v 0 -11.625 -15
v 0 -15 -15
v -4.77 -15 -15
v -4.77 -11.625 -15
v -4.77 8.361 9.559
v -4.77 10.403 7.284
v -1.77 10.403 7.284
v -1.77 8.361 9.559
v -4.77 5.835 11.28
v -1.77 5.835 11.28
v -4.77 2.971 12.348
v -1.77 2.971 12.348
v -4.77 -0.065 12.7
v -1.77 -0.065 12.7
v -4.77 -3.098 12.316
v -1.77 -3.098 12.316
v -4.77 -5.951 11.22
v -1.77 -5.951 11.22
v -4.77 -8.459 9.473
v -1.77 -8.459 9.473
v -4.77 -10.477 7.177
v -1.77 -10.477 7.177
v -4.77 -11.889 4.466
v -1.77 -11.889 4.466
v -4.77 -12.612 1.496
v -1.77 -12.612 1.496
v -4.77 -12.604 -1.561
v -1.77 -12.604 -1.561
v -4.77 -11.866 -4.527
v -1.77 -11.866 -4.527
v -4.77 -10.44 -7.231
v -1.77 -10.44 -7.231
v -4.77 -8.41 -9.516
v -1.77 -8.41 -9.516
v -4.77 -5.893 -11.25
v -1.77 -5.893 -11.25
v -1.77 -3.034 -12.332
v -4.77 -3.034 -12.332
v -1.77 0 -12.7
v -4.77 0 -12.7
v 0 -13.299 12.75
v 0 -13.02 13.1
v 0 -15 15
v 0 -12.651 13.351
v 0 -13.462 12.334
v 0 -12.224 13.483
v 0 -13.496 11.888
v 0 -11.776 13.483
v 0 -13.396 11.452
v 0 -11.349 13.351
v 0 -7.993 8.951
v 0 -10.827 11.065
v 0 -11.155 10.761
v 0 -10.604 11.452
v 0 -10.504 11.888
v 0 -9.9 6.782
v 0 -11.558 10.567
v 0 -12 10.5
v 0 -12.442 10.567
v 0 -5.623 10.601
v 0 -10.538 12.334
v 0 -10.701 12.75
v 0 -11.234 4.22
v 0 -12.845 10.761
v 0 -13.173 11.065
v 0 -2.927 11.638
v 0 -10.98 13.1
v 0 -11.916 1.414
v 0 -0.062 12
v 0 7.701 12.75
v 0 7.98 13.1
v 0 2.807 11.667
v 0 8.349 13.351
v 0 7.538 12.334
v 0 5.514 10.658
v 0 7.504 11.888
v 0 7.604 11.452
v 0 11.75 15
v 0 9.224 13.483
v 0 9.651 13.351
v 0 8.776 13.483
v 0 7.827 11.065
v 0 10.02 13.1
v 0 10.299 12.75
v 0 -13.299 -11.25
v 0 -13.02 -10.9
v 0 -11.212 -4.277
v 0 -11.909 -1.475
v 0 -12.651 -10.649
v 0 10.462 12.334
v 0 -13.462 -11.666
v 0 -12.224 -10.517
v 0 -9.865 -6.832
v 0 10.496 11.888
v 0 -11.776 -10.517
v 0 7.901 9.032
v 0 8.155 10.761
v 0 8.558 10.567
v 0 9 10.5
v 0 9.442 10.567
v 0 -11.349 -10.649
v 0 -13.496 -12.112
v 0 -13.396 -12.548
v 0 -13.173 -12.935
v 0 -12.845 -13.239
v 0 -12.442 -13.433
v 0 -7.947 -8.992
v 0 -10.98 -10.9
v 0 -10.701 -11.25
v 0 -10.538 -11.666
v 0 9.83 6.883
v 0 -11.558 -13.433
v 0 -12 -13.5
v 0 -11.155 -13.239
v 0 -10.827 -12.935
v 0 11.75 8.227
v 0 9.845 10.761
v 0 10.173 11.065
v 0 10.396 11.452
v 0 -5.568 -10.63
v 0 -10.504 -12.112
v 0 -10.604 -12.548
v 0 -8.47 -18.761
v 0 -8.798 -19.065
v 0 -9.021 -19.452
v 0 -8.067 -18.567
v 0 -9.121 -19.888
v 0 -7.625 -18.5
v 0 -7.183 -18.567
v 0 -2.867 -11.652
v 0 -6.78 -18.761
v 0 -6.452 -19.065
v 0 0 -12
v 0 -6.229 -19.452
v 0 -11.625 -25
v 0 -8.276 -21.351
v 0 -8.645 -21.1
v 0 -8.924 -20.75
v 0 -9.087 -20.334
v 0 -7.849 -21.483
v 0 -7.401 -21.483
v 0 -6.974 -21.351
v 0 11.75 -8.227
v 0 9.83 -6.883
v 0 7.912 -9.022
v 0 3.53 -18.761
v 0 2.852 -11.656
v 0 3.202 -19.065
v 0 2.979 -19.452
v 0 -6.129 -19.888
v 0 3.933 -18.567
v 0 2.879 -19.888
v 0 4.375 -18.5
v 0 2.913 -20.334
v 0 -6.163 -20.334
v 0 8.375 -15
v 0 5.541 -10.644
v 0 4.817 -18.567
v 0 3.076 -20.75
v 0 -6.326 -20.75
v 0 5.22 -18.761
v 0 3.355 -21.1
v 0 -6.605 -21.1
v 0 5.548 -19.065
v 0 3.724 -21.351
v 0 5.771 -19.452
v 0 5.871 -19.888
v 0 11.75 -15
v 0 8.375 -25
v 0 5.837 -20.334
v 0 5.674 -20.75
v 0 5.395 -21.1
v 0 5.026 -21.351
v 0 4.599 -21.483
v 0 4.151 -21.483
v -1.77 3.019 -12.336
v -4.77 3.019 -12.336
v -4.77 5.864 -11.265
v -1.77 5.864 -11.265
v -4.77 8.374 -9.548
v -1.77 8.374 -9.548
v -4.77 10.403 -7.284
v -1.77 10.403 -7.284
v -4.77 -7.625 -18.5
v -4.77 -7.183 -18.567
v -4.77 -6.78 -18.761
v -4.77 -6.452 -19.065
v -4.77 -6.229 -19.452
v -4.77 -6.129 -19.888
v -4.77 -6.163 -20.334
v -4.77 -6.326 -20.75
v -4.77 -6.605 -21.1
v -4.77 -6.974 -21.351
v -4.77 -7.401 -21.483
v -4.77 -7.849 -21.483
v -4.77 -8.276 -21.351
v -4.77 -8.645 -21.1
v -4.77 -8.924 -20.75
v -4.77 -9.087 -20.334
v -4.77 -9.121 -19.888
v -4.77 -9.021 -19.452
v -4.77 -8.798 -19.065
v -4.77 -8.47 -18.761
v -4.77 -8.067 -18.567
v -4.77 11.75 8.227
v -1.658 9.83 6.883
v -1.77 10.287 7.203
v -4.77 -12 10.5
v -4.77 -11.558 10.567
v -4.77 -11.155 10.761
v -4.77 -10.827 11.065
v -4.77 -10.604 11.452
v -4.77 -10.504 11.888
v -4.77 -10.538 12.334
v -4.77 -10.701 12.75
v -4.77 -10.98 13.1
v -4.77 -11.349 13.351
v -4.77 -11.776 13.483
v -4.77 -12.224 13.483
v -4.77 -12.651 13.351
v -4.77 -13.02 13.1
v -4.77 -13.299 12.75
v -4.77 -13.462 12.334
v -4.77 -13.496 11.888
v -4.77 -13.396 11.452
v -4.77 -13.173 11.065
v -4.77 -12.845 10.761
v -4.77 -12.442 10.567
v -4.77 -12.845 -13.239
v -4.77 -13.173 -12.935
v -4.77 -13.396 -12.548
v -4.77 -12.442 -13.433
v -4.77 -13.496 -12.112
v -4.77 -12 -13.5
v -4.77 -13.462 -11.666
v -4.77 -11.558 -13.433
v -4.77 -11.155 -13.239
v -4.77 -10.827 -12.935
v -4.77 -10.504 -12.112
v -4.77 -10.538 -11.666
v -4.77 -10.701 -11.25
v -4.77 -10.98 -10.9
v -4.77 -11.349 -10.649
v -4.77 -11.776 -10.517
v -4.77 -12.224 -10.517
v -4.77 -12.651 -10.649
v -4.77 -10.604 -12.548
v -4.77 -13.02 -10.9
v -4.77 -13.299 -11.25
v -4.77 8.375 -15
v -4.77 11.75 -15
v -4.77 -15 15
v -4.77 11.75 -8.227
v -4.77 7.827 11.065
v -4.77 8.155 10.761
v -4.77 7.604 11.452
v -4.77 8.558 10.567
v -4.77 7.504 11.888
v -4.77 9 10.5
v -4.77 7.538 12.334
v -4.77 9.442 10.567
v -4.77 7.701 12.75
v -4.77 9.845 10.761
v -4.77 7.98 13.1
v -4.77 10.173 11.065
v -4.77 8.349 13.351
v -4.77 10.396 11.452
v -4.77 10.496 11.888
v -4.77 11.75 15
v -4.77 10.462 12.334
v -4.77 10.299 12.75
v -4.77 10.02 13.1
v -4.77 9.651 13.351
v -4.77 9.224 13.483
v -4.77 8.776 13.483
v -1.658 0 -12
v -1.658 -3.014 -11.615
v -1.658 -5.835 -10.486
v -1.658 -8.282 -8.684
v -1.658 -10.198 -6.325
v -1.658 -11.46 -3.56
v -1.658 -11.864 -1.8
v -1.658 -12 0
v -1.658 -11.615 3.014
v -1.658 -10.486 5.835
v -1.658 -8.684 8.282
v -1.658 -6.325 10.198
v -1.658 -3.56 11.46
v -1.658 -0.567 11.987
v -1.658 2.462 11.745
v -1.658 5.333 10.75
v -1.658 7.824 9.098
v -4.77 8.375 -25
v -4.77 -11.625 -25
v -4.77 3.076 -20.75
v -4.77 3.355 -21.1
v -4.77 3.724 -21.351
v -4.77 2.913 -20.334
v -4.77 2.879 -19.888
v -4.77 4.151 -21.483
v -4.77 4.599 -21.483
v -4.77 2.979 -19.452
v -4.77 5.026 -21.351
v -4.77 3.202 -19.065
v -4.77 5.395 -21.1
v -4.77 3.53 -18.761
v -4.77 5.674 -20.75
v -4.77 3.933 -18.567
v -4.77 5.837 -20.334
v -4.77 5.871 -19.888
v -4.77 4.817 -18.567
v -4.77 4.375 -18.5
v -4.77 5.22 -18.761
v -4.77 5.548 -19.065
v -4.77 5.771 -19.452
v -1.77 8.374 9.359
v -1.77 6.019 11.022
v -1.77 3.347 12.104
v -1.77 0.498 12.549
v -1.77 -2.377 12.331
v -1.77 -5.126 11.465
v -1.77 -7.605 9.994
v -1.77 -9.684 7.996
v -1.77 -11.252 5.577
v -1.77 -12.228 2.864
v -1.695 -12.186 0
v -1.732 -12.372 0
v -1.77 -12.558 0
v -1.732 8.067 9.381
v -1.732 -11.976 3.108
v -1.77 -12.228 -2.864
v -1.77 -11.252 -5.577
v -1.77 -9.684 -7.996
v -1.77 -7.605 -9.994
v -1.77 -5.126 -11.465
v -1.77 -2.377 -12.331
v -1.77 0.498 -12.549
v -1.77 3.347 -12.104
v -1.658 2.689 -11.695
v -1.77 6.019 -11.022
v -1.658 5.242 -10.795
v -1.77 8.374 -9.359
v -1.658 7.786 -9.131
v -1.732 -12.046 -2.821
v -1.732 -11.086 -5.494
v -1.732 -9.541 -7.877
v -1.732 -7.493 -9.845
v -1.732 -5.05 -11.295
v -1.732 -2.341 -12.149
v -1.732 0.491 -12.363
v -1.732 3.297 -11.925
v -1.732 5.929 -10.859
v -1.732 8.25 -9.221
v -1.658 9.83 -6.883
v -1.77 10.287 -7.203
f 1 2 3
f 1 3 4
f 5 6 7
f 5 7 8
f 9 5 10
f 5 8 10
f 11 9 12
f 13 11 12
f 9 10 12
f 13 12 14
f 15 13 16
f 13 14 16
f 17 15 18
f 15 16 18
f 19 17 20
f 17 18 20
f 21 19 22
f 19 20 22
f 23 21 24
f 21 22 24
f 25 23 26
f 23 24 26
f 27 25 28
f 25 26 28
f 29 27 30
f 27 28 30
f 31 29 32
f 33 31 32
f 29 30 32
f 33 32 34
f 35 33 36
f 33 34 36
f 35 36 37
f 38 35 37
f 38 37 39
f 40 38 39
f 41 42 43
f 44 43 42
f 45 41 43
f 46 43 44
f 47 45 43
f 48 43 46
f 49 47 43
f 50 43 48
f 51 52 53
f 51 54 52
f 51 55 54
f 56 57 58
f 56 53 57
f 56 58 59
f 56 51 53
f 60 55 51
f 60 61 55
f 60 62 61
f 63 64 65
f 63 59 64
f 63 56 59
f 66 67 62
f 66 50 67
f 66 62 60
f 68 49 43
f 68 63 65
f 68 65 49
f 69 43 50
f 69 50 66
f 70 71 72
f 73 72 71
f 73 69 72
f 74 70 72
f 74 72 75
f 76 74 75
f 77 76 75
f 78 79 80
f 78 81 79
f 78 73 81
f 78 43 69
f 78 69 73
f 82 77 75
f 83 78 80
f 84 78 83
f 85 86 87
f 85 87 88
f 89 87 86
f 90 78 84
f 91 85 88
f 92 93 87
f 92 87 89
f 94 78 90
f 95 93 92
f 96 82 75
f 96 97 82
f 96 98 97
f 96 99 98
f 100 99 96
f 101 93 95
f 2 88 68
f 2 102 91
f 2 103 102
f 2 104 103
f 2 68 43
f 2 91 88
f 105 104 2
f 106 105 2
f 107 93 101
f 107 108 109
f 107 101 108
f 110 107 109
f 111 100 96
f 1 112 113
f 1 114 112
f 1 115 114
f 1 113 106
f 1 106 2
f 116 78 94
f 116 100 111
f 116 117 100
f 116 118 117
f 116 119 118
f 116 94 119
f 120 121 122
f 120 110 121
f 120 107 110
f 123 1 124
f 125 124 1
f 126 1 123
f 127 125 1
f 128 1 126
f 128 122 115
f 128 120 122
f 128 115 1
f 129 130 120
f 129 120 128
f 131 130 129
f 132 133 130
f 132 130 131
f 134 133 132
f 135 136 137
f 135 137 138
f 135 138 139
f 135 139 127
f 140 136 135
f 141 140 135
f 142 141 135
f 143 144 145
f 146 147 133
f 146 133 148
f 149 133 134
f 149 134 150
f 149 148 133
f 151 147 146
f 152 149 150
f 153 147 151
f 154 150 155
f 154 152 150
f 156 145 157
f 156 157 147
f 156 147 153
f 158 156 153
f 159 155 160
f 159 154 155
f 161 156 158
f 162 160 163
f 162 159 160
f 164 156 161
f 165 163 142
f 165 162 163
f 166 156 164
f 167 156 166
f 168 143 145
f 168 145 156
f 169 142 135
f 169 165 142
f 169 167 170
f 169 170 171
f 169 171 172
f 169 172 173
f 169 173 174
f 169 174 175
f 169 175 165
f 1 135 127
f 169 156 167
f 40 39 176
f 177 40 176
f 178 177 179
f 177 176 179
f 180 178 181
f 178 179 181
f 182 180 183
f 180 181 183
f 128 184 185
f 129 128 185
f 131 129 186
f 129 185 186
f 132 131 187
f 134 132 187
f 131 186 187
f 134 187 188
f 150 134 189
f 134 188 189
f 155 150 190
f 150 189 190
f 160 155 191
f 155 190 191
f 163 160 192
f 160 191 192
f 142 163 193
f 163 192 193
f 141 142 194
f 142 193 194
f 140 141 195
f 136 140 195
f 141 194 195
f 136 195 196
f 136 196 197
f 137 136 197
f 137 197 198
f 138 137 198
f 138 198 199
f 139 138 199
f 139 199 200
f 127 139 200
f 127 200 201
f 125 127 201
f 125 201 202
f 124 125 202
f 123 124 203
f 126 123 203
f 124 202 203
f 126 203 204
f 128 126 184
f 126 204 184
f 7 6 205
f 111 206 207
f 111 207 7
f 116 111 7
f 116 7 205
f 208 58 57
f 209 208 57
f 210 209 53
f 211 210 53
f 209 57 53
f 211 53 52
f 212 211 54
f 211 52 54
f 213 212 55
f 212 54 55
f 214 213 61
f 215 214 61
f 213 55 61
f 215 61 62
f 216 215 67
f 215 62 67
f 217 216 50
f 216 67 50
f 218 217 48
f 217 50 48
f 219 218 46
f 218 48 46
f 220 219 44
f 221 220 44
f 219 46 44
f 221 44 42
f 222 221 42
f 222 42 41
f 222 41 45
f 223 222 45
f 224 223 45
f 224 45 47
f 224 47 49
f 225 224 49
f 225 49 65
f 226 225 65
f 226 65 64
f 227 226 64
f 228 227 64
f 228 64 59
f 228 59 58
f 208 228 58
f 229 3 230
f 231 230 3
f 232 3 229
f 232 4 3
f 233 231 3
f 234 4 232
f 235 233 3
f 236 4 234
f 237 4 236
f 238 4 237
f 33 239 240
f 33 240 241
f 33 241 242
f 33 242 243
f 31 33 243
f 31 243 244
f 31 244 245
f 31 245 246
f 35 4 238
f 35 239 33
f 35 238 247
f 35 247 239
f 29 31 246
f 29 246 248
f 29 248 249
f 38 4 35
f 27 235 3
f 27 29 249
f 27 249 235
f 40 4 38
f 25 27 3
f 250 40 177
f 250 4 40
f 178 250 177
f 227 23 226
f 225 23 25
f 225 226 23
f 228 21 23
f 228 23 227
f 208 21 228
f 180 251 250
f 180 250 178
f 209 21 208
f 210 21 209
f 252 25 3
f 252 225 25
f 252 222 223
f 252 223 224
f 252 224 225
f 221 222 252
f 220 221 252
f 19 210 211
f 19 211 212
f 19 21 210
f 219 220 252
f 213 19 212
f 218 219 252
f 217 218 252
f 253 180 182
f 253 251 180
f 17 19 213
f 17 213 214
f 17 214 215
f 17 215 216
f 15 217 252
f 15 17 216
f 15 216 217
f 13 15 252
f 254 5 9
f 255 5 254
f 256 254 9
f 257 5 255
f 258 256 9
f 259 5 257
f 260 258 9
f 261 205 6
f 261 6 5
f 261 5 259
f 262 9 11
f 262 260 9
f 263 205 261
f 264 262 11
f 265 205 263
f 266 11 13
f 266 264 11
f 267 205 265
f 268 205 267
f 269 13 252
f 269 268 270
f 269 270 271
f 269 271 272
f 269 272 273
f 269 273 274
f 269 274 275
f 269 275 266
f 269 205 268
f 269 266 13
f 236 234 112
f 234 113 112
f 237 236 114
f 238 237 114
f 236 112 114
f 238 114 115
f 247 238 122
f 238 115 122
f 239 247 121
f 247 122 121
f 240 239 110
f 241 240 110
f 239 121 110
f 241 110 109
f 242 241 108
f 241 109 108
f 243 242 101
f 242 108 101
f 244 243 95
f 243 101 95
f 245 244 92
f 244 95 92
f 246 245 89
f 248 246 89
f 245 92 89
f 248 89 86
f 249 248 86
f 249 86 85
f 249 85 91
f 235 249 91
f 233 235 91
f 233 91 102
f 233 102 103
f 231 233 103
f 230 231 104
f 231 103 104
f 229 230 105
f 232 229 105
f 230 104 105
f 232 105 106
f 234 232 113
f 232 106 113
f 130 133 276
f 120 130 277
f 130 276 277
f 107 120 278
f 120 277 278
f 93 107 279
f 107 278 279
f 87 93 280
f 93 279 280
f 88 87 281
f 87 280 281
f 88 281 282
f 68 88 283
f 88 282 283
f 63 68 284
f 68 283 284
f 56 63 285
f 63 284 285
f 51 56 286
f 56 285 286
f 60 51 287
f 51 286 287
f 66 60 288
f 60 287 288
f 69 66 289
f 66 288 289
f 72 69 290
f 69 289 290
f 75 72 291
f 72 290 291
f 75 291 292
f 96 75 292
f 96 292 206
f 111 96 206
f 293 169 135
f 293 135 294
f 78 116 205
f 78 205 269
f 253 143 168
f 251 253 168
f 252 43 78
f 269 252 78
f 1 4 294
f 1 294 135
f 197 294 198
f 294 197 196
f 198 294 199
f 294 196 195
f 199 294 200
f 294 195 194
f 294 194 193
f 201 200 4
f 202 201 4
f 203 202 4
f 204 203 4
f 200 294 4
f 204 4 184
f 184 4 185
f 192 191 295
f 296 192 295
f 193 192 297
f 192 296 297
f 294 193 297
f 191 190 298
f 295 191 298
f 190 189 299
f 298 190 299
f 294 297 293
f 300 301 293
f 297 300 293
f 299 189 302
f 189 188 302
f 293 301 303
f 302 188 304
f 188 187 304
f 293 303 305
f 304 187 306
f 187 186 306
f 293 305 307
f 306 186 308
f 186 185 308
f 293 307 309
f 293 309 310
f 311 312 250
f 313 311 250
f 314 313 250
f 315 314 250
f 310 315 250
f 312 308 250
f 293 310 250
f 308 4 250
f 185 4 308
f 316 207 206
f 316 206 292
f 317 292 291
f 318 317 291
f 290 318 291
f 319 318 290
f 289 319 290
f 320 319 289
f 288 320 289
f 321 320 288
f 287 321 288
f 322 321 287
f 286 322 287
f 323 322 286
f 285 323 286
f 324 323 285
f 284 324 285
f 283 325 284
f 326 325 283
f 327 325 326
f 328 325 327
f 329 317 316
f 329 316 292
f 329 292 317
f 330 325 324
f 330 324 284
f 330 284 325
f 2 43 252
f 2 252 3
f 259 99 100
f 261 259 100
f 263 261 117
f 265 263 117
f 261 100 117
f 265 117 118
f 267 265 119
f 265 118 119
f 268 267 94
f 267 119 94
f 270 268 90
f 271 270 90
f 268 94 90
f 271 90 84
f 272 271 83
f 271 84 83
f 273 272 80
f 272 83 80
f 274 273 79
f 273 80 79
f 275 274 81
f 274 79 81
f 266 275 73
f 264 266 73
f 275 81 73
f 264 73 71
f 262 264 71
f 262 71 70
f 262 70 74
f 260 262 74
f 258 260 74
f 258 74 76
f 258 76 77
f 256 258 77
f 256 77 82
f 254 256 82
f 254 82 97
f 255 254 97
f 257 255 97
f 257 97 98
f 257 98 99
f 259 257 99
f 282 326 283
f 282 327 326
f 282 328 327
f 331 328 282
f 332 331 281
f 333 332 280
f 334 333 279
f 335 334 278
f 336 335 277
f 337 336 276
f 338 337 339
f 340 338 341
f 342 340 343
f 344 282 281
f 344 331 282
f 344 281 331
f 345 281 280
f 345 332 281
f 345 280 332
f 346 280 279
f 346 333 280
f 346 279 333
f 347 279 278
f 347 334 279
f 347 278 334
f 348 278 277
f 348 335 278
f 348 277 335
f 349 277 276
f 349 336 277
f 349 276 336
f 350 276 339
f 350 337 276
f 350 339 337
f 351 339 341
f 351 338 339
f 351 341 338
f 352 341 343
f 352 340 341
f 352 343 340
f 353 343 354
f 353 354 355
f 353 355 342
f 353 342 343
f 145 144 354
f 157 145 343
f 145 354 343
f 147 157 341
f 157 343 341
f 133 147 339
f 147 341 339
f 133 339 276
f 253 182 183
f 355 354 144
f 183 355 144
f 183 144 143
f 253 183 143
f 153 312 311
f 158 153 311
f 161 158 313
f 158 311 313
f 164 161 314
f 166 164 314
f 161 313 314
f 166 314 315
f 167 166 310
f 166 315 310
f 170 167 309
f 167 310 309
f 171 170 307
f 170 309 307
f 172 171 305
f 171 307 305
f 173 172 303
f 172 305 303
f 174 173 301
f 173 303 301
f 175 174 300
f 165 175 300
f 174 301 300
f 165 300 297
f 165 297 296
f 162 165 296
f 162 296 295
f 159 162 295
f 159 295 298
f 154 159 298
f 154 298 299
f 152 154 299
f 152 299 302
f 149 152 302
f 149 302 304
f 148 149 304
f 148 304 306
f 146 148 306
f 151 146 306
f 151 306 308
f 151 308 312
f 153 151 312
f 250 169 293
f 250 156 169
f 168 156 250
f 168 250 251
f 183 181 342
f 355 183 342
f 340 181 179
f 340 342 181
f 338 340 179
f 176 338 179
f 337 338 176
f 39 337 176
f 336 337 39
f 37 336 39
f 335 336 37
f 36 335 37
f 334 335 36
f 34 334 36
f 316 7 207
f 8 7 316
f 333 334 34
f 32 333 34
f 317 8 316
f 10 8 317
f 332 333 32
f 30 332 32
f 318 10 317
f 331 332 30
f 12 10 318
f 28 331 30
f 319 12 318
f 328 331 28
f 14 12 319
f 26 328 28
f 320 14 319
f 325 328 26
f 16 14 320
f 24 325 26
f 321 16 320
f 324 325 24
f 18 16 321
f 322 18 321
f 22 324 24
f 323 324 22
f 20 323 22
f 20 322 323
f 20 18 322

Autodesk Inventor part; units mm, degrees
ref_plane "YZ Plane" through (0, 0, 0) normal (1, 0, 0) x (0, 1, 0)
ref_plane "XZ Plane" through (0, 0, 0) normal (0, 1, 0) x (-1, 0, 0)
sketch "Sketch1" plane through (0, 0, 0) normal (1, 0, 0) x (0, 1, 0)
  line L0 (-15, 15) -> (15, 15)
  line L1 (15, 15) -> (15, -15)
  line L2 (15, -15) -> (-15, -15)
  line L3 (-15, -15) -> (-15, 15)
  line L4 (-15, 15) -> (15, -15) construction
  line L5 (15, 15) -> (-15, -15) construction
  point P0 (0, 0)
  dimension "d0" = 30
  dimension "d1" = 30
extrude "Extrusion1" add sketch "Sketch1" along normal blind 1.7695
sketch "Sketch2" plane through (1.7695, 0, 0) normal (1, 0, 0) x (0, 0, -1)
  circle A0 centre (0, 0) radius 12
  dimension "d4" = 24
extrude "Extrusion2" cut sketch "Sketch2" against normal up to next
sketch "Sketch3" plane through (0, 0, 0) normal (0, 0, 1) x (1, 0, 0)
  line L0 (1.7695, 15) -> (1.7695, -15) projected
  line L1 (1.7695, 0) -> (1.7695, -12.5584)
  line L2 (0.5, 0) -> (1.7695, 0)
  arc A0 (0.5, 0) -> (1.7695, -12.5584) centre (63.25, 0) ccw
  point P0 (0, 0)
  dimension "d7" = 12.5584
  dimension "d8" = 125.5
revolve "Revolution1" cut sketch "Sketch3" angle 360 about axis through (0.5, 0, 0) along (1, 0, 0)
sketch "Sketch4" plane through (1.7695, 0, 0) normal (1, 0, 0) x (0, 0, -1)
  circle A0 centre (0, 0) radius 12.7
  line L0 (-15, 15) -> (-15, -15) projected
  line L1 (-15, 15) -> (15, 15)
  line L2 (15, 15) -> (15, -15)
  line L3 (15, -15) -> (-15, -15)
  line L4 (-15, -15) -> (-15, 15)
  dimension "d10" = 25.4
extrude "Extrusion3" add sketch "Sketch4" along normal blind 3
ref_plane "Work Plane1" through (0, 0, 0) normal (-1, 0, 0) x (0, 0, 1)
mirror "Mirror1" about plane through (0, 0, 0) normal (-1, 0, 0) of "Extrusion1", "Extrusion2", "Revolution1", "Extrusion3"
sketch "Sketch8" plane through (4.7695, 0, 0) normal (1, 0, 0) x (0, 0, -1)
  circle A0 centre (12, -12) radius 1.5
  line L0 (-15, -15) -> (15, -15) projected
  line L1 (15, -15) -> (15, 15) projected
  circle A1 centre (-12, -12) radius 1.5
  circle A2 centre (-12, 9) radius 1.5
  line L2 (-15, 15) -> (-15, -15) projected
  line L3 (15, 15) -> (-15, 15) projected
  point P0 (0, 0)
  dimension "d30" = 3
  dimension "d31" = 3
  dimension "d32" = 3
  dimension "d33" = 3
  dimension "d34" = 3
  dimension "d35" = 3
  dimension "d36" = 6
extrude "Extrusion7" cut sketch "Sketch8" against normal up to surface (9.5391 mm away) contours A0 | A1 | A2
sketch "Sketch9" plane through (4.7695, 0, 0) normal (1, 0, 0) x (0, 0, -1)
  line L0 (0, 0) -> (-8.2274, 11.75)
  line L1 (-8.2274, 11.75) -> (-15, 11.75)
  line L2 (-15, 15) -> (-15, -15) projected
  line L3 (0, 0) -> (0, 15) construction
  line L4 (-15, 11.75) -> (-15, 15)
  line L5 (15, 15) -> (-15, 15) projected
  line L6 (0, 15) -> (-15, 15)
  line L7 (0, 0) -> (8.2274, 11.75)
  line L8 (8.2274, 11.75) -> (15, 11.75)
  line L9 (15, 15) -> (15, -15)
  line L10 (-15, 15) -> (15, 15)
  dimension "d39" = 35
  dimension "d42" = 3.25
extrude "Extrusion8" cut sketch "Sketch9" against normal up to surface (9.5391 mm away)
sketch "Sketch11" plane through (4.7695, -15, -15) normal (0, 0, -1) x (-1, 0, 0)
  line L0 (9.5391, 0) -> (9.5391, 26.75) projected
  line L1 (0, 0) -> (9.5391, 26.75) construction
  line L2 (0, 26.75) -> (9.5391, 26.75) projected
  line L3 (0, 26.75) -> (9.5391, 0) construction
  line L4 (0, 0) -> (0, 26.75) projected
  line L5 (9.5391, 3.375) -> (0, 3.375)
  line L6 (0, 3.375) -> (0, 23.375)
  line L7 (0, 23.375) -> (9.5391, 23.375)
  line L8 (9.5391, 23.375) -> (9.5391, 3.375)
  line L9 (9.5391, 3.375) -> (0, 23.375) construction
  line L10 (0, 3.375) -> (9.5391, 23.375) construction
  point P0 (4.7695, 15)
  point P1 (4.7695, 13.375)
  dimension "d46" = 20
extrude "Extrusion10" add sketch "Sketch11" along normal blind 10 contours L5 L4 L7 L0
sketch "Sketch12" plane through (-4.7695, -15, -15) normal (-1, 0, 0) x (0, 0, 1)
  circle A0 centre (-5, 19.375) radius 1.5
  circle A1 centre (-5, 7.375) radius 1.5
  line L0 (0, 3.375) -> (-10, 3.375) projected
  line L1 (0, 23.375) -> (-10, 23.375) projected
  point P0 (15, 15)
  dimension "d49" = 4
  dimension "d50" = 5
  dimension "d51" = 4
  dimension "d52" = 5
  dimension "d53" = 3
extrude "Extrusion11" cut sketch "Sketch12" against normal up to surface (9.5391 mm away)
sketch "Sketch13" plane through (4.7695, -15, -15) normal (0, -1, 0) x (1, 0, 0)
  line L0 (-9.5391, 30) -> (0, 30) projected
  line L1 (-4.7695, 30) -> (-4.7695, -10)
  line L2 (0, -10) -> (-9.5391, -10) projected
  point P0 (-4.7695, 15)
split body "Split2" sketch "Sketch13" result one side removed curves L1 removed pieces at (0.5, -13.971, -0.4809)
equation "\"d37\" = d32"
properties part number "LargeLensHolderP1S2" material "Acetal Resin, Black"
